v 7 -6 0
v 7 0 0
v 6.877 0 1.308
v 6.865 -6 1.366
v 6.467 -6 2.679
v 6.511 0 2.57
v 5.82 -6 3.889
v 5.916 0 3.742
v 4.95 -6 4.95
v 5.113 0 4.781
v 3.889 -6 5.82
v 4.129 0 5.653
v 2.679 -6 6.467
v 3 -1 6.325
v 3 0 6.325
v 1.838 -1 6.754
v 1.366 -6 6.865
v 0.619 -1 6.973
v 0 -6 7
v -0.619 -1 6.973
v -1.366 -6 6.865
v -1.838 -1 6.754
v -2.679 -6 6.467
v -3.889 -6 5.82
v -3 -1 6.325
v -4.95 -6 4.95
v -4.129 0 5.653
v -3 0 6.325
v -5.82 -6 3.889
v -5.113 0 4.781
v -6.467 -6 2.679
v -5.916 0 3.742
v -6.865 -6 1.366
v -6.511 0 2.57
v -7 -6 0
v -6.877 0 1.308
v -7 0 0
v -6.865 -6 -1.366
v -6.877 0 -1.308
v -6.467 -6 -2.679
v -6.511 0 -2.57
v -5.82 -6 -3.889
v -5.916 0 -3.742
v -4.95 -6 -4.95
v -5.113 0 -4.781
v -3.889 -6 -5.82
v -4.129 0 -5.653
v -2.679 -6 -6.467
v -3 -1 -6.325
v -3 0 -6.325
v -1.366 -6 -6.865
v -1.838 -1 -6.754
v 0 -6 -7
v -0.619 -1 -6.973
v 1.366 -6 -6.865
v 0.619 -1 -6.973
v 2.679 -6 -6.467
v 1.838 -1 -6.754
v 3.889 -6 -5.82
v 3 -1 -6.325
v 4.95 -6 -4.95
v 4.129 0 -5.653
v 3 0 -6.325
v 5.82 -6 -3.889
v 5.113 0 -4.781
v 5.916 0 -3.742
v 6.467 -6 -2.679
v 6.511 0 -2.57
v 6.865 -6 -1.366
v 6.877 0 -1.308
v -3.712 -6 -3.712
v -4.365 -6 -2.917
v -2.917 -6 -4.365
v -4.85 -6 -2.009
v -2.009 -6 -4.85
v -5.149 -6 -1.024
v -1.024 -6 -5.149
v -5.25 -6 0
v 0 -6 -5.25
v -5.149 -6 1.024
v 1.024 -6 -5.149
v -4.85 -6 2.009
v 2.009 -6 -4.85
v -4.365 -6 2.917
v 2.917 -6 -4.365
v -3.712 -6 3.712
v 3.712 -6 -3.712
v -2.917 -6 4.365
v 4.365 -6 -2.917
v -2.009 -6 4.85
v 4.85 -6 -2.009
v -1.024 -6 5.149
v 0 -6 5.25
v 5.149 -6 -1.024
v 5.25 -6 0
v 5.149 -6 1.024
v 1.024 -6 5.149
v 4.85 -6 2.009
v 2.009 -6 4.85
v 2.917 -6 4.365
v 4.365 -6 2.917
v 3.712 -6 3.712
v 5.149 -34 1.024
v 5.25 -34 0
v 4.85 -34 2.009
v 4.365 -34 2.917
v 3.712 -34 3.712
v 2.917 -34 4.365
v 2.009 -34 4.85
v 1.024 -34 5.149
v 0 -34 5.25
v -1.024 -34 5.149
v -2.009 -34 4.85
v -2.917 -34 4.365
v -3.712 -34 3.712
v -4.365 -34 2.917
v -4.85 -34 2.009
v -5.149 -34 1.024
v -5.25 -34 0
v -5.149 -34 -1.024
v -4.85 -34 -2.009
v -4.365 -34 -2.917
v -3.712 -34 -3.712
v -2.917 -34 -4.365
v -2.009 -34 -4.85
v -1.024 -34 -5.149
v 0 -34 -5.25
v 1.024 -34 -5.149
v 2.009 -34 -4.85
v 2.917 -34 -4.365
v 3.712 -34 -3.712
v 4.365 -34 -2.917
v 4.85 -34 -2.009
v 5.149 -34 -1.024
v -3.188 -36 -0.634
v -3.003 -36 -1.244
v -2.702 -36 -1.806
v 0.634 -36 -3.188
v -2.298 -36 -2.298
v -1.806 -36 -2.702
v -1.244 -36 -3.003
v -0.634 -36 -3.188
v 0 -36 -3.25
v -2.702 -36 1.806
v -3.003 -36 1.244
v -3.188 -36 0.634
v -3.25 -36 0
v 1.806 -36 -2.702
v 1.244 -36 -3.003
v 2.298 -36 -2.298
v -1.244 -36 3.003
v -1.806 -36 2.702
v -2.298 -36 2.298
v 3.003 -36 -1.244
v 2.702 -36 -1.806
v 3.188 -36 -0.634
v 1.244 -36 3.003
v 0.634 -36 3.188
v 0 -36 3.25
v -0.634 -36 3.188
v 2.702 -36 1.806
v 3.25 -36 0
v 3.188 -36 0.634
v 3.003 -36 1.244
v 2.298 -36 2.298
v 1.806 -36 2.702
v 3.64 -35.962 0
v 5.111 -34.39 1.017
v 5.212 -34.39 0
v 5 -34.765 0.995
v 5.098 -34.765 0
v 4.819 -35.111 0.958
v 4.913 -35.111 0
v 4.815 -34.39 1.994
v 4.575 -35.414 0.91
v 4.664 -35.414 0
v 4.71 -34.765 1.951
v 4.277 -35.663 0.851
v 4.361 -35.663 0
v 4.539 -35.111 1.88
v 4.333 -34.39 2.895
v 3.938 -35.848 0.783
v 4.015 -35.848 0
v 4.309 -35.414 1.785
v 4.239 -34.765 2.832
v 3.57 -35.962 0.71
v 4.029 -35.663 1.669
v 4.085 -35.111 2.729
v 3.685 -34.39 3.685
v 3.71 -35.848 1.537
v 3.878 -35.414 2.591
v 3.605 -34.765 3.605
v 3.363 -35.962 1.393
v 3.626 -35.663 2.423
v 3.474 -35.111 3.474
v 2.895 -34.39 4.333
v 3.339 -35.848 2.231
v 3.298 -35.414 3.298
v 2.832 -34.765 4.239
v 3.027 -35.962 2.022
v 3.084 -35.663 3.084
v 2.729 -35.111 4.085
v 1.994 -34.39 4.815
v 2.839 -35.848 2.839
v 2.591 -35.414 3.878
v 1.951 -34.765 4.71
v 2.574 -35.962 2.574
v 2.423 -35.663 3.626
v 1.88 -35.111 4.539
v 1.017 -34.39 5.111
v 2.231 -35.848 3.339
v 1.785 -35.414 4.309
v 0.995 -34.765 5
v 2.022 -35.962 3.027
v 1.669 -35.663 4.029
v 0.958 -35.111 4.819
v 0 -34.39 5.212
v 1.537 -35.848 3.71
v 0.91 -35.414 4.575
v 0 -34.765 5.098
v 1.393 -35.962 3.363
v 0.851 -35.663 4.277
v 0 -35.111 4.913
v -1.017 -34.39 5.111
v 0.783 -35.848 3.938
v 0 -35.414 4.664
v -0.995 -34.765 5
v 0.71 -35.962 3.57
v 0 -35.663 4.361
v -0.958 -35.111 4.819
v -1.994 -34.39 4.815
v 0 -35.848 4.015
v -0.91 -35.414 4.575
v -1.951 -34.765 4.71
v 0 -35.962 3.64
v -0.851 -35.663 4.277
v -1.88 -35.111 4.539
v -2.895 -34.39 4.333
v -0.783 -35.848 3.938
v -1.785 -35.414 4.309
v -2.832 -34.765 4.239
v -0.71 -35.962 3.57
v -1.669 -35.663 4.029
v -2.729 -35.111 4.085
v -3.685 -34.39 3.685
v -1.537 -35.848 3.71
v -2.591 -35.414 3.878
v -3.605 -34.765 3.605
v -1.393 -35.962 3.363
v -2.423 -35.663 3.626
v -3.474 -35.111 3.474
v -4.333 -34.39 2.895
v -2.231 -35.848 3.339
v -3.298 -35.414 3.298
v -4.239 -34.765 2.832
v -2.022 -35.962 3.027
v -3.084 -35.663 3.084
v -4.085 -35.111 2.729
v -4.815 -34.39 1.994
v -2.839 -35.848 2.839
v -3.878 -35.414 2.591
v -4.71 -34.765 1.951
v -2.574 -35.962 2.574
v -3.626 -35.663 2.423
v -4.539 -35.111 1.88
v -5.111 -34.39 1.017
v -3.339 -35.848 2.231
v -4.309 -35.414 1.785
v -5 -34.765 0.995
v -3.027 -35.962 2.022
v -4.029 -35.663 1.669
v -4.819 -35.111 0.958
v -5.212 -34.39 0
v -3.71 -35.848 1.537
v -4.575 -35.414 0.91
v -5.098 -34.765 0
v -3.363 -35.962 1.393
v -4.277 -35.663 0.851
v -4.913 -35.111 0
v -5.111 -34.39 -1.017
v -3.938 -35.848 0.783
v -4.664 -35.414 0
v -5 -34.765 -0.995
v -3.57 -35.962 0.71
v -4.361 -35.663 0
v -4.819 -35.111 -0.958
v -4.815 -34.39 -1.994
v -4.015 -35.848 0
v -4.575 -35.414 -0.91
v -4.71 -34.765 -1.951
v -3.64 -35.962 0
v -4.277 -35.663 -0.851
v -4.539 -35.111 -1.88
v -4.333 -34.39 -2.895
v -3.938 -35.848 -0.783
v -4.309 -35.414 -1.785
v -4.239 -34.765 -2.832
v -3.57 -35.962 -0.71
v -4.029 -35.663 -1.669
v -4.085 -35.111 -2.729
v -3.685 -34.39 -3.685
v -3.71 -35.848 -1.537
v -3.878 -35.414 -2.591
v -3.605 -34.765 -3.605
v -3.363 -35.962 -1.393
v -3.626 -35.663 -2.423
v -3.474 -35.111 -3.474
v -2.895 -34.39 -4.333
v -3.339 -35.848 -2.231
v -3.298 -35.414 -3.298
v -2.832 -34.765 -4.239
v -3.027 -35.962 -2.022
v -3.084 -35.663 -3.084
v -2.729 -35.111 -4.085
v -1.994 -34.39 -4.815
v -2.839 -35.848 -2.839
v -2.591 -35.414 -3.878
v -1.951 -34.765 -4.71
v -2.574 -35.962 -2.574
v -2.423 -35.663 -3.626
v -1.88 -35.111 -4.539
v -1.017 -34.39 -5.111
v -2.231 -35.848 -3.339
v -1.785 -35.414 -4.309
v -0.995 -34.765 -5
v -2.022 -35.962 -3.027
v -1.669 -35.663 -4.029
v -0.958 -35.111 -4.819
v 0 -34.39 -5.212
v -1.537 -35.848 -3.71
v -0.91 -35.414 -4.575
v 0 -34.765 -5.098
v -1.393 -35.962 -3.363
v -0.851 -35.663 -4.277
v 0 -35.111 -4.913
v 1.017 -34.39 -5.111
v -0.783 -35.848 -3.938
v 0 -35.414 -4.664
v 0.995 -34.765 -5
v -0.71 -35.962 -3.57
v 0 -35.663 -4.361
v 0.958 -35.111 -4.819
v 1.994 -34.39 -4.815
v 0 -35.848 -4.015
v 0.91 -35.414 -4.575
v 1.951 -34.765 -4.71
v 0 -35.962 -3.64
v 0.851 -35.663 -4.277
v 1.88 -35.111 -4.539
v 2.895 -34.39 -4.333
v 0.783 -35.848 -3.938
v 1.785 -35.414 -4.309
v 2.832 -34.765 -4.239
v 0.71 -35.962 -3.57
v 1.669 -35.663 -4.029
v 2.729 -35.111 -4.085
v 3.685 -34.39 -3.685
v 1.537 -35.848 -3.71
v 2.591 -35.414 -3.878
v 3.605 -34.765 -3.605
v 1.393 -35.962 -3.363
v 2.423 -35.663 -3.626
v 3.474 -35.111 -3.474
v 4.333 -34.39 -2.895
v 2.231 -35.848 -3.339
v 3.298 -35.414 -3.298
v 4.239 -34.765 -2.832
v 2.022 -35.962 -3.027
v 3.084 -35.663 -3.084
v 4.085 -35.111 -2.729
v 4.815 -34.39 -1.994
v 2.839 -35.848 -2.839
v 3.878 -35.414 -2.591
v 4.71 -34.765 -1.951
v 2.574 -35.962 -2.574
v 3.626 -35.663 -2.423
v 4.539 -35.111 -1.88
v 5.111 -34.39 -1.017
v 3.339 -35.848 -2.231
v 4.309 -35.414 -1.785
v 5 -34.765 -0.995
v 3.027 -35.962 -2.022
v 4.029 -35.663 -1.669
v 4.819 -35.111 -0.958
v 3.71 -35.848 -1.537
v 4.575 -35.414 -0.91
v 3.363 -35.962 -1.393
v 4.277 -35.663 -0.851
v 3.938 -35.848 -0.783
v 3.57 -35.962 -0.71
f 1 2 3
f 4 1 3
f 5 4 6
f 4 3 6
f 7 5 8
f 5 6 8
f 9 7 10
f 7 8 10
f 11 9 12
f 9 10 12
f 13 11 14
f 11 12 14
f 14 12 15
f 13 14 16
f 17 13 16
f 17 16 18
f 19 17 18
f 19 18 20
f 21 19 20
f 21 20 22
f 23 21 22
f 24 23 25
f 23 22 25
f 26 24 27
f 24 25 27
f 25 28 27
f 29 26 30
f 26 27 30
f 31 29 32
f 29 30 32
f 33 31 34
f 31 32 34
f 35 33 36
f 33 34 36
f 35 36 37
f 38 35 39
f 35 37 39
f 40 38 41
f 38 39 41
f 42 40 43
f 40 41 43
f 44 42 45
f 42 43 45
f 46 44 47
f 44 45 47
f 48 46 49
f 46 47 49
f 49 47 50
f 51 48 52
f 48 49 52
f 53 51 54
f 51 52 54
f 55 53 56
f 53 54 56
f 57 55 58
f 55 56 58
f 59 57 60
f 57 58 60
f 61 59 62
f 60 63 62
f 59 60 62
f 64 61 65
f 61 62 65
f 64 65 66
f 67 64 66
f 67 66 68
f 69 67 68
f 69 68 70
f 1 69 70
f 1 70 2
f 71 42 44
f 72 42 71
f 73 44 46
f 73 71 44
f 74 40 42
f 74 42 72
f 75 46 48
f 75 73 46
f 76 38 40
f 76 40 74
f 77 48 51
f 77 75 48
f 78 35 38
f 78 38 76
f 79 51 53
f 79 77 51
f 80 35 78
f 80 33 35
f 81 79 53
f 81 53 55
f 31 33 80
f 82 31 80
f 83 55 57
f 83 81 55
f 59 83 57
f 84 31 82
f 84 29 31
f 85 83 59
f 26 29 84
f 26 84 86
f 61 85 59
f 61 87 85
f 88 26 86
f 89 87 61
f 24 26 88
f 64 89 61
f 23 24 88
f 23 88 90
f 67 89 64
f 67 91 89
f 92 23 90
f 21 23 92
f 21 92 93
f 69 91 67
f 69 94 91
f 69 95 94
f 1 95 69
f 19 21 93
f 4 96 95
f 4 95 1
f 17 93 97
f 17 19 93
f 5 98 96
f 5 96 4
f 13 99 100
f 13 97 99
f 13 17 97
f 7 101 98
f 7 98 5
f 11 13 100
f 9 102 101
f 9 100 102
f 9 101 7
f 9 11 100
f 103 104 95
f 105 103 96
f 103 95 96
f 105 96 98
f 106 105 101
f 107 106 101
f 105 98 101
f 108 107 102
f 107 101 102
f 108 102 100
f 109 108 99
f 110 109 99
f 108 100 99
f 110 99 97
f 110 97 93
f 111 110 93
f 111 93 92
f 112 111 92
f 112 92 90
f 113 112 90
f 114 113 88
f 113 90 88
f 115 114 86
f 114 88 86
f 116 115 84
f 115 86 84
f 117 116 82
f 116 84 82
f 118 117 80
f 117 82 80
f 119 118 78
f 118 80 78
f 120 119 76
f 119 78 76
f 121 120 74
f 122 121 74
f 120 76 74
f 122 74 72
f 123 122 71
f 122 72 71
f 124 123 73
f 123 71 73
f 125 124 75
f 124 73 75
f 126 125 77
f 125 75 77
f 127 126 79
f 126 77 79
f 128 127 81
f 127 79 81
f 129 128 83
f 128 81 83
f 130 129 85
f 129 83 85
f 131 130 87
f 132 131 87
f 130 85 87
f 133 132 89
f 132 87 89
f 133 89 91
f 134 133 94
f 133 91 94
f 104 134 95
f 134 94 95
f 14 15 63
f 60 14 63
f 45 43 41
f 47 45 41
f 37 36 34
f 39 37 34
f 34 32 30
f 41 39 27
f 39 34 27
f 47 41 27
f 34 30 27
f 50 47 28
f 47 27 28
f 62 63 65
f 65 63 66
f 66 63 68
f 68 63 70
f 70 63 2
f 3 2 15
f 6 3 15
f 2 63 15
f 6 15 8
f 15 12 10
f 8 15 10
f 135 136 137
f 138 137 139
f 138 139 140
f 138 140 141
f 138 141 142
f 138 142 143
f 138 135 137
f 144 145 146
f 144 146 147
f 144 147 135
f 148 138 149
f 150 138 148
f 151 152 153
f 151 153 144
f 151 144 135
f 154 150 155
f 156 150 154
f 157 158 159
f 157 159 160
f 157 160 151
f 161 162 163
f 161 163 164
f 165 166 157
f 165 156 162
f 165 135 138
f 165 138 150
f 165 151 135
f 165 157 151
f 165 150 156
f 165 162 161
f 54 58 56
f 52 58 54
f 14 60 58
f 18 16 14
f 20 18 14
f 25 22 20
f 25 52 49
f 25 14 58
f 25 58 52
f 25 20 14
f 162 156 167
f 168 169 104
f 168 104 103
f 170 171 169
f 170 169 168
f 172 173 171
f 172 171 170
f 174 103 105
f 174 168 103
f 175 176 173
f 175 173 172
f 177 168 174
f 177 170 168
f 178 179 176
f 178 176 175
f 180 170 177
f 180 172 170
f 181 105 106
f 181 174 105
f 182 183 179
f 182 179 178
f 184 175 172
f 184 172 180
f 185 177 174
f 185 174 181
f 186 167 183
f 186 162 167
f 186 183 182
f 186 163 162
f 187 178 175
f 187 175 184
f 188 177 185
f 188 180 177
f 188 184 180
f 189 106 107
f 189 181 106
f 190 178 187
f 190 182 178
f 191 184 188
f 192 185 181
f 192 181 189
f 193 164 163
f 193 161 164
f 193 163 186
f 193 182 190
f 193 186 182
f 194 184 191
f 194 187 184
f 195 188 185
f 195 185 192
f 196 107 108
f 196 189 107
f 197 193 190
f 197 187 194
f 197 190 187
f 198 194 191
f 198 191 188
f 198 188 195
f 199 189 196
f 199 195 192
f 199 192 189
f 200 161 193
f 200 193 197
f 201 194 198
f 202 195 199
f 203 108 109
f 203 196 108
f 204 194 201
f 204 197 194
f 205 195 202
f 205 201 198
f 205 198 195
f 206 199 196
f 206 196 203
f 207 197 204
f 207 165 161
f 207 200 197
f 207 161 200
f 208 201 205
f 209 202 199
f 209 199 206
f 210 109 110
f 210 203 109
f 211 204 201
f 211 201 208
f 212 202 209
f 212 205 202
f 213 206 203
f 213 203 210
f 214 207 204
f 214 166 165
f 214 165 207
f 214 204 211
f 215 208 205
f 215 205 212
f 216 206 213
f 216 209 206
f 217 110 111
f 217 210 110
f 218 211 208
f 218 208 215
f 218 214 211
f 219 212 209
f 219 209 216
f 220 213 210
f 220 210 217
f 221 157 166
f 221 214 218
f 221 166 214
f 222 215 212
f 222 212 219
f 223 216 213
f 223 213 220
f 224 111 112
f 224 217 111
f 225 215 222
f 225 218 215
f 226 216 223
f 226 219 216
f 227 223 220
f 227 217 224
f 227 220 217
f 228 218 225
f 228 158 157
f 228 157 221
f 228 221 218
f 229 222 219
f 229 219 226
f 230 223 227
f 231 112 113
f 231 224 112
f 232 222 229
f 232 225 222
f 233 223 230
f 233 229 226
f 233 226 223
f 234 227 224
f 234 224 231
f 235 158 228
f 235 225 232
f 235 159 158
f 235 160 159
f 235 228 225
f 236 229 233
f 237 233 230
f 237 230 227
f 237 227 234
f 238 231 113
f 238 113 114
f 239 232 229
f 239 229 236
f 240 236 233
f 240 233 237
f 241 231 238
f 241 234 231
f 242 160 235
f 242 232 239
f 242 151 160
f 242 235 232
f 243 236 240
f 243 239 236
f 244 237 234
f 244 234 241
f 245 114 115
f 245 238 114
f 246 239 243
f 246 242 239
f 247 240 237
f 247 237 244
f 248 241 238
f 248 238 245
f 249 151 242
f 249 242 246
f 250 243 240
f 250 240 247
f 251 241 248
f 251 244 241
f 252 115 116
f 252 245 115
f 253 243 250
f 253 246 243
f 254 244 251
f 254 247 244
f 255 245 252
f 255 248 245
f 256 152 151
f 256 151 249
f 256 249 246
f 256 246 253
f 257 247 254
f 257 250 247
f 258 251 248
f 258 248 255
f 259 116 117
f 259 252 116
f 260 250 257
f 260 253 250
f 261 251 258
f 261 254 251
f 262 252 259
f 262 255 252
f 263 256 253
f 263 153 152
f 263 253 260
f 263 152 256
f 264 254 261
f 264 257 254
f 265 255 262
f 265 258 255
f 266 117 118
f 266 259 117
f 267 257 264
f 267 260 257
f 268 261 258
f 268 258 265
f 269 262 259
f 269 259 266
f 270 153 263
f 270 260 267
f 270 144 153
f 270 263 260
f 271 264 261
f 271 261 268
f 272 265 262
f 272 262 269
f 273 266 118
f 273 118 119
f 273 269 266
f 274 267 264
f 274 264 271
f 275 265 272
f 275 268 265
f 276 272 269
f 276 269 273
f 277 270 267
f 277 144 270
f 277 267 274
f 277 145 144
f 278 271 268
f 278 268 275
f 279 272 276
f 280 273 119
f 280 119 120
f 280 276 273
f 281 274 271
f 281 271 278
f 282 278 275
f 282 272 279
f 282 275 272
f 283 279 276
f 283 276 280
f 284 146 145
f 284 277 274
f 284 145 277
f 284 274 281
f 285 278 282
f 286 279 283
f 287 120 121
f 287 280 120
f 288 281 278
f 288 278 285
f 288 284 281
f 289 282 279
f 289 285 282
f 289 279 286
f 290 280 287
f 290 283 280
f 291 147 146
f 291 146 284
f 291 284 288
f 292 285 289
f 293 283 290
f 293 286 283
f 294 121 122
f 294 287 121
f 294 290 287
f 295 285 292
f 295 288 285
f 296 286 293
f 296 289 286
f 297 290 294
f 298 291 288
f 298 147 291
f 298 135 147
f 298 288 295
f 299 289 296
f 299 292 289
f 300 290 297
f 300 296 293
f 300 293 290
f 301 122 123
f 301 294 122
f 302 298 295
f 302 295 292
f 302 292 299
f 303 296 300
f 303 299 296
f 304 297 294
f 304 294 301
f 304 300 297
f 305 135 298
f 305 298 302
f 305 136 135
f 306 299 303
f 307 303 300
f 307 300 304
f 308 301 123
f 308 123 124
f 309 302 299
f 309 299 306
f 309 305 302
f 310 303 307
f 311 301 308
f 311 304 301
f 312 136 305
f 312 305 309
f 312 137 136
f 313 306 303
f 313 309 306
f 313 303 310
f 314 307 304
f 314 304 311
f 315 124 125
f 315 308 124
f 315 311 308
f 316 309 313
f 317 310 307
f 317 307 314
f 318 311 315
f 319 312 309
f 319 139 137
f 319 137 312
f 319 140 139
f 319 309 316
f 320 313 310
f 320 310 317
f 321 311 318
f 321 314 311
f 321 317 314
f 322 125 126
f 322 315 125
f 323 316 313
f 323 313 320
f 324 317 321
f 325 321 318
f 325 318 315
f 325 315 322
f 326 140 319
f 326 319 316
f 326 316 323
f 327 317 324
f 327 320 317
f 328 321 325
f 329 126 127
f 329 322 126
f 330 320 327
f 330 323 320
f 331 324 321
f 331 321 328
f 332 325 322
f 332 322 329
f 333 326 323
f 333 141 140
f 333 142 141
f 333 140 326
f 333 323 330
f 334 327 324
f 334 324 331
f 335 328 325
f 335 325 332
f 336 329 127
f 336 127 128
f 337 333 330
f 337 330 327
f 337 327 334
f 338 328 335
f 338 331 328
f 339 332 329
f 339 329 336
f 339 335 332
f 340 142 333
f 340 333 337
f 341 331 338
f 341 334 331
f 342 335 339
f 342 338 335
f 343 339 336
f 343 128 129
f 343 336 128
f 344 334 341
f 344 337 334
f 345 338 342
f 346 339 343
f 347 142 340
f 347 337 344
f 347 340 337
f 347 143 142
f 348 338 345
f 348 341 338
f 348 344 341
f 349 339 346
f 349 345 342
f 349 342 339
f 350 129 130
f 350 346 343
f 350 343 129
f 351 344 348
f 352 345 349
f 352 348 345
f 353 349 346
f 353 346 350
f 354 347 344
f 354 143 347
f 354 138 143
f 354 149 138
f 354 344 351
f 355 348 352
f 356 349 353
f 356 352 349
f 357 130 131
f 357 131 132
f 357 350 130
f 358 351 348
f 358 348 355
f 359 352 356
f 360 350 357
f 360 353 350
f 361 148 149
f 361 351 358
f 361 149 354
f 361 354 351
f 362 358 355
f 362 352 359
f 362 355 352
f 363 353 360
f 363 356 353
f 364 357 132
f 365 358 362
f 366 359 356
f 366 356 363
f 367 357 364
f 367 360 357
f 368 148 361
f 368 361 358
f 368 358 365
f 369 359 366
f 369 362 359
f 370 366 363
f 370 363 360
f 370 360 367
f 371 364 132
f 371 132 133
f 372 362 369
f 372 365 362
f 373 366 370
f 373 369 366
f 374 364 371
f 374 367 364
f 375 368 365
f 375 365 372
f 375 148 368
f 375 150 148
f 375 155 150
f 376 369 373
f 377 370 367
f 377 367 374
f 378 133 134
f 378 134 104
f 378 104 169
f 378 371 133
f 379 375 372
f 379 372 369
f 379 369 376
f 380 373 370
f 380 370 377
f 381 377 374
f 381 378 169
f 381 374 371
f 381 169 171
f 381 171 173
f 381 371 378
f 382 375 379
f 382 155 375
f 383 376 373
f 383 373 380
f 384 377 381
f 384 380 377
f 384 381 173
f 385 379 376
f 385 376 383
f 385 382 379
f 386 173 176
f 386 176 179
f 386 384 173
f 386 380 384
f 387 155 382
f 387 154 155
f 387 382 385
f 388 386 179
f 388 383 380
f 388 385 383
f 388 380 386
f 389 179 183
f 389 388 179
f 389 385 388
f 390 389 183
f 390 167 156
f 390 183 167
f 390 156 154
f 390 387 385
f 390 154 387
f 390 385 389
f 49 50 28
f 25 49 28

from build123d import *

# Parameters (mm, degrees)
F0_R     = 7
F1_DEPTH = 6
F2_R     = 5.25
F3_DEPTH = 30
F5_DEPTH = 1
F6_R     = 2


with BuildPart() as f1:
    # F0 (on Front) → F1 (new body)
    with BuildSketch(Plane.XZ):
        Circle(F0_R)
    extrude(amount=F1_DEPTH)

    # F2 (on face) → F3 (join)
    with BuildSketch(Plane.XZ.offset(6)):
        Circle(F2_R)
    extrude(amount=F3_DEPTH)

    # F4 (on face) → F5 (cut)
    with BuildSketch(Plane(origin=(0, 0, 0), x_dir=(-1, 0, 0), z_dir=(0, 1, 0))):
        with BuildLine():
            Line((-2.4702025112, 9.5145767555), (-3, 9.5145767555))
            Line((-3, 9.5145767555), (-3, 6.3245553203))
            ThreePointArc((-3, 6.3245553203), (0, 7), (3, 6.3245553203))
            Line((3, 6.3245553203), (3, 9.5145767555))
            Line((3, 9.5145767555), (-2.4702025112, 9.5145767555))
        make_face()
        with BuildLine():
            ThreePointArc((3, -6.3245553203), (0, -7), (-3, -6.3245553203))
            Line((-3, -6.3245553203), (-3, -11.1439647153))
            Line((-3, -11.1439647153), (3, -11.1439647153))
            Line((3, -11.1439647153), (3, -6.3245553203))
        make_face()
        with BuildLine():
            ThreePointArc((3, 6.3245553203), (0, 7), (-3, 6.3245553203))
            Line((-3, 6.3245553203), (-3, -6.3245553203))
            ThreePointArc((-3, -6.3245553203), (0, -7), (3, -6.3245553203))
            Line((3, -6.3245553203), (3, 6.3245553203))
        make_face()
    extrude(amount=-F5_DEPTH, mode=Mode.SUBTRACT)

    # F6
    f6_edges = [f1.edges().sort_by_distance(p)[0] for p in [
        (-5.25, -36, 0),
    ]]
    fillet(f6_edges, radius=F6_R)


solid = f1.part
